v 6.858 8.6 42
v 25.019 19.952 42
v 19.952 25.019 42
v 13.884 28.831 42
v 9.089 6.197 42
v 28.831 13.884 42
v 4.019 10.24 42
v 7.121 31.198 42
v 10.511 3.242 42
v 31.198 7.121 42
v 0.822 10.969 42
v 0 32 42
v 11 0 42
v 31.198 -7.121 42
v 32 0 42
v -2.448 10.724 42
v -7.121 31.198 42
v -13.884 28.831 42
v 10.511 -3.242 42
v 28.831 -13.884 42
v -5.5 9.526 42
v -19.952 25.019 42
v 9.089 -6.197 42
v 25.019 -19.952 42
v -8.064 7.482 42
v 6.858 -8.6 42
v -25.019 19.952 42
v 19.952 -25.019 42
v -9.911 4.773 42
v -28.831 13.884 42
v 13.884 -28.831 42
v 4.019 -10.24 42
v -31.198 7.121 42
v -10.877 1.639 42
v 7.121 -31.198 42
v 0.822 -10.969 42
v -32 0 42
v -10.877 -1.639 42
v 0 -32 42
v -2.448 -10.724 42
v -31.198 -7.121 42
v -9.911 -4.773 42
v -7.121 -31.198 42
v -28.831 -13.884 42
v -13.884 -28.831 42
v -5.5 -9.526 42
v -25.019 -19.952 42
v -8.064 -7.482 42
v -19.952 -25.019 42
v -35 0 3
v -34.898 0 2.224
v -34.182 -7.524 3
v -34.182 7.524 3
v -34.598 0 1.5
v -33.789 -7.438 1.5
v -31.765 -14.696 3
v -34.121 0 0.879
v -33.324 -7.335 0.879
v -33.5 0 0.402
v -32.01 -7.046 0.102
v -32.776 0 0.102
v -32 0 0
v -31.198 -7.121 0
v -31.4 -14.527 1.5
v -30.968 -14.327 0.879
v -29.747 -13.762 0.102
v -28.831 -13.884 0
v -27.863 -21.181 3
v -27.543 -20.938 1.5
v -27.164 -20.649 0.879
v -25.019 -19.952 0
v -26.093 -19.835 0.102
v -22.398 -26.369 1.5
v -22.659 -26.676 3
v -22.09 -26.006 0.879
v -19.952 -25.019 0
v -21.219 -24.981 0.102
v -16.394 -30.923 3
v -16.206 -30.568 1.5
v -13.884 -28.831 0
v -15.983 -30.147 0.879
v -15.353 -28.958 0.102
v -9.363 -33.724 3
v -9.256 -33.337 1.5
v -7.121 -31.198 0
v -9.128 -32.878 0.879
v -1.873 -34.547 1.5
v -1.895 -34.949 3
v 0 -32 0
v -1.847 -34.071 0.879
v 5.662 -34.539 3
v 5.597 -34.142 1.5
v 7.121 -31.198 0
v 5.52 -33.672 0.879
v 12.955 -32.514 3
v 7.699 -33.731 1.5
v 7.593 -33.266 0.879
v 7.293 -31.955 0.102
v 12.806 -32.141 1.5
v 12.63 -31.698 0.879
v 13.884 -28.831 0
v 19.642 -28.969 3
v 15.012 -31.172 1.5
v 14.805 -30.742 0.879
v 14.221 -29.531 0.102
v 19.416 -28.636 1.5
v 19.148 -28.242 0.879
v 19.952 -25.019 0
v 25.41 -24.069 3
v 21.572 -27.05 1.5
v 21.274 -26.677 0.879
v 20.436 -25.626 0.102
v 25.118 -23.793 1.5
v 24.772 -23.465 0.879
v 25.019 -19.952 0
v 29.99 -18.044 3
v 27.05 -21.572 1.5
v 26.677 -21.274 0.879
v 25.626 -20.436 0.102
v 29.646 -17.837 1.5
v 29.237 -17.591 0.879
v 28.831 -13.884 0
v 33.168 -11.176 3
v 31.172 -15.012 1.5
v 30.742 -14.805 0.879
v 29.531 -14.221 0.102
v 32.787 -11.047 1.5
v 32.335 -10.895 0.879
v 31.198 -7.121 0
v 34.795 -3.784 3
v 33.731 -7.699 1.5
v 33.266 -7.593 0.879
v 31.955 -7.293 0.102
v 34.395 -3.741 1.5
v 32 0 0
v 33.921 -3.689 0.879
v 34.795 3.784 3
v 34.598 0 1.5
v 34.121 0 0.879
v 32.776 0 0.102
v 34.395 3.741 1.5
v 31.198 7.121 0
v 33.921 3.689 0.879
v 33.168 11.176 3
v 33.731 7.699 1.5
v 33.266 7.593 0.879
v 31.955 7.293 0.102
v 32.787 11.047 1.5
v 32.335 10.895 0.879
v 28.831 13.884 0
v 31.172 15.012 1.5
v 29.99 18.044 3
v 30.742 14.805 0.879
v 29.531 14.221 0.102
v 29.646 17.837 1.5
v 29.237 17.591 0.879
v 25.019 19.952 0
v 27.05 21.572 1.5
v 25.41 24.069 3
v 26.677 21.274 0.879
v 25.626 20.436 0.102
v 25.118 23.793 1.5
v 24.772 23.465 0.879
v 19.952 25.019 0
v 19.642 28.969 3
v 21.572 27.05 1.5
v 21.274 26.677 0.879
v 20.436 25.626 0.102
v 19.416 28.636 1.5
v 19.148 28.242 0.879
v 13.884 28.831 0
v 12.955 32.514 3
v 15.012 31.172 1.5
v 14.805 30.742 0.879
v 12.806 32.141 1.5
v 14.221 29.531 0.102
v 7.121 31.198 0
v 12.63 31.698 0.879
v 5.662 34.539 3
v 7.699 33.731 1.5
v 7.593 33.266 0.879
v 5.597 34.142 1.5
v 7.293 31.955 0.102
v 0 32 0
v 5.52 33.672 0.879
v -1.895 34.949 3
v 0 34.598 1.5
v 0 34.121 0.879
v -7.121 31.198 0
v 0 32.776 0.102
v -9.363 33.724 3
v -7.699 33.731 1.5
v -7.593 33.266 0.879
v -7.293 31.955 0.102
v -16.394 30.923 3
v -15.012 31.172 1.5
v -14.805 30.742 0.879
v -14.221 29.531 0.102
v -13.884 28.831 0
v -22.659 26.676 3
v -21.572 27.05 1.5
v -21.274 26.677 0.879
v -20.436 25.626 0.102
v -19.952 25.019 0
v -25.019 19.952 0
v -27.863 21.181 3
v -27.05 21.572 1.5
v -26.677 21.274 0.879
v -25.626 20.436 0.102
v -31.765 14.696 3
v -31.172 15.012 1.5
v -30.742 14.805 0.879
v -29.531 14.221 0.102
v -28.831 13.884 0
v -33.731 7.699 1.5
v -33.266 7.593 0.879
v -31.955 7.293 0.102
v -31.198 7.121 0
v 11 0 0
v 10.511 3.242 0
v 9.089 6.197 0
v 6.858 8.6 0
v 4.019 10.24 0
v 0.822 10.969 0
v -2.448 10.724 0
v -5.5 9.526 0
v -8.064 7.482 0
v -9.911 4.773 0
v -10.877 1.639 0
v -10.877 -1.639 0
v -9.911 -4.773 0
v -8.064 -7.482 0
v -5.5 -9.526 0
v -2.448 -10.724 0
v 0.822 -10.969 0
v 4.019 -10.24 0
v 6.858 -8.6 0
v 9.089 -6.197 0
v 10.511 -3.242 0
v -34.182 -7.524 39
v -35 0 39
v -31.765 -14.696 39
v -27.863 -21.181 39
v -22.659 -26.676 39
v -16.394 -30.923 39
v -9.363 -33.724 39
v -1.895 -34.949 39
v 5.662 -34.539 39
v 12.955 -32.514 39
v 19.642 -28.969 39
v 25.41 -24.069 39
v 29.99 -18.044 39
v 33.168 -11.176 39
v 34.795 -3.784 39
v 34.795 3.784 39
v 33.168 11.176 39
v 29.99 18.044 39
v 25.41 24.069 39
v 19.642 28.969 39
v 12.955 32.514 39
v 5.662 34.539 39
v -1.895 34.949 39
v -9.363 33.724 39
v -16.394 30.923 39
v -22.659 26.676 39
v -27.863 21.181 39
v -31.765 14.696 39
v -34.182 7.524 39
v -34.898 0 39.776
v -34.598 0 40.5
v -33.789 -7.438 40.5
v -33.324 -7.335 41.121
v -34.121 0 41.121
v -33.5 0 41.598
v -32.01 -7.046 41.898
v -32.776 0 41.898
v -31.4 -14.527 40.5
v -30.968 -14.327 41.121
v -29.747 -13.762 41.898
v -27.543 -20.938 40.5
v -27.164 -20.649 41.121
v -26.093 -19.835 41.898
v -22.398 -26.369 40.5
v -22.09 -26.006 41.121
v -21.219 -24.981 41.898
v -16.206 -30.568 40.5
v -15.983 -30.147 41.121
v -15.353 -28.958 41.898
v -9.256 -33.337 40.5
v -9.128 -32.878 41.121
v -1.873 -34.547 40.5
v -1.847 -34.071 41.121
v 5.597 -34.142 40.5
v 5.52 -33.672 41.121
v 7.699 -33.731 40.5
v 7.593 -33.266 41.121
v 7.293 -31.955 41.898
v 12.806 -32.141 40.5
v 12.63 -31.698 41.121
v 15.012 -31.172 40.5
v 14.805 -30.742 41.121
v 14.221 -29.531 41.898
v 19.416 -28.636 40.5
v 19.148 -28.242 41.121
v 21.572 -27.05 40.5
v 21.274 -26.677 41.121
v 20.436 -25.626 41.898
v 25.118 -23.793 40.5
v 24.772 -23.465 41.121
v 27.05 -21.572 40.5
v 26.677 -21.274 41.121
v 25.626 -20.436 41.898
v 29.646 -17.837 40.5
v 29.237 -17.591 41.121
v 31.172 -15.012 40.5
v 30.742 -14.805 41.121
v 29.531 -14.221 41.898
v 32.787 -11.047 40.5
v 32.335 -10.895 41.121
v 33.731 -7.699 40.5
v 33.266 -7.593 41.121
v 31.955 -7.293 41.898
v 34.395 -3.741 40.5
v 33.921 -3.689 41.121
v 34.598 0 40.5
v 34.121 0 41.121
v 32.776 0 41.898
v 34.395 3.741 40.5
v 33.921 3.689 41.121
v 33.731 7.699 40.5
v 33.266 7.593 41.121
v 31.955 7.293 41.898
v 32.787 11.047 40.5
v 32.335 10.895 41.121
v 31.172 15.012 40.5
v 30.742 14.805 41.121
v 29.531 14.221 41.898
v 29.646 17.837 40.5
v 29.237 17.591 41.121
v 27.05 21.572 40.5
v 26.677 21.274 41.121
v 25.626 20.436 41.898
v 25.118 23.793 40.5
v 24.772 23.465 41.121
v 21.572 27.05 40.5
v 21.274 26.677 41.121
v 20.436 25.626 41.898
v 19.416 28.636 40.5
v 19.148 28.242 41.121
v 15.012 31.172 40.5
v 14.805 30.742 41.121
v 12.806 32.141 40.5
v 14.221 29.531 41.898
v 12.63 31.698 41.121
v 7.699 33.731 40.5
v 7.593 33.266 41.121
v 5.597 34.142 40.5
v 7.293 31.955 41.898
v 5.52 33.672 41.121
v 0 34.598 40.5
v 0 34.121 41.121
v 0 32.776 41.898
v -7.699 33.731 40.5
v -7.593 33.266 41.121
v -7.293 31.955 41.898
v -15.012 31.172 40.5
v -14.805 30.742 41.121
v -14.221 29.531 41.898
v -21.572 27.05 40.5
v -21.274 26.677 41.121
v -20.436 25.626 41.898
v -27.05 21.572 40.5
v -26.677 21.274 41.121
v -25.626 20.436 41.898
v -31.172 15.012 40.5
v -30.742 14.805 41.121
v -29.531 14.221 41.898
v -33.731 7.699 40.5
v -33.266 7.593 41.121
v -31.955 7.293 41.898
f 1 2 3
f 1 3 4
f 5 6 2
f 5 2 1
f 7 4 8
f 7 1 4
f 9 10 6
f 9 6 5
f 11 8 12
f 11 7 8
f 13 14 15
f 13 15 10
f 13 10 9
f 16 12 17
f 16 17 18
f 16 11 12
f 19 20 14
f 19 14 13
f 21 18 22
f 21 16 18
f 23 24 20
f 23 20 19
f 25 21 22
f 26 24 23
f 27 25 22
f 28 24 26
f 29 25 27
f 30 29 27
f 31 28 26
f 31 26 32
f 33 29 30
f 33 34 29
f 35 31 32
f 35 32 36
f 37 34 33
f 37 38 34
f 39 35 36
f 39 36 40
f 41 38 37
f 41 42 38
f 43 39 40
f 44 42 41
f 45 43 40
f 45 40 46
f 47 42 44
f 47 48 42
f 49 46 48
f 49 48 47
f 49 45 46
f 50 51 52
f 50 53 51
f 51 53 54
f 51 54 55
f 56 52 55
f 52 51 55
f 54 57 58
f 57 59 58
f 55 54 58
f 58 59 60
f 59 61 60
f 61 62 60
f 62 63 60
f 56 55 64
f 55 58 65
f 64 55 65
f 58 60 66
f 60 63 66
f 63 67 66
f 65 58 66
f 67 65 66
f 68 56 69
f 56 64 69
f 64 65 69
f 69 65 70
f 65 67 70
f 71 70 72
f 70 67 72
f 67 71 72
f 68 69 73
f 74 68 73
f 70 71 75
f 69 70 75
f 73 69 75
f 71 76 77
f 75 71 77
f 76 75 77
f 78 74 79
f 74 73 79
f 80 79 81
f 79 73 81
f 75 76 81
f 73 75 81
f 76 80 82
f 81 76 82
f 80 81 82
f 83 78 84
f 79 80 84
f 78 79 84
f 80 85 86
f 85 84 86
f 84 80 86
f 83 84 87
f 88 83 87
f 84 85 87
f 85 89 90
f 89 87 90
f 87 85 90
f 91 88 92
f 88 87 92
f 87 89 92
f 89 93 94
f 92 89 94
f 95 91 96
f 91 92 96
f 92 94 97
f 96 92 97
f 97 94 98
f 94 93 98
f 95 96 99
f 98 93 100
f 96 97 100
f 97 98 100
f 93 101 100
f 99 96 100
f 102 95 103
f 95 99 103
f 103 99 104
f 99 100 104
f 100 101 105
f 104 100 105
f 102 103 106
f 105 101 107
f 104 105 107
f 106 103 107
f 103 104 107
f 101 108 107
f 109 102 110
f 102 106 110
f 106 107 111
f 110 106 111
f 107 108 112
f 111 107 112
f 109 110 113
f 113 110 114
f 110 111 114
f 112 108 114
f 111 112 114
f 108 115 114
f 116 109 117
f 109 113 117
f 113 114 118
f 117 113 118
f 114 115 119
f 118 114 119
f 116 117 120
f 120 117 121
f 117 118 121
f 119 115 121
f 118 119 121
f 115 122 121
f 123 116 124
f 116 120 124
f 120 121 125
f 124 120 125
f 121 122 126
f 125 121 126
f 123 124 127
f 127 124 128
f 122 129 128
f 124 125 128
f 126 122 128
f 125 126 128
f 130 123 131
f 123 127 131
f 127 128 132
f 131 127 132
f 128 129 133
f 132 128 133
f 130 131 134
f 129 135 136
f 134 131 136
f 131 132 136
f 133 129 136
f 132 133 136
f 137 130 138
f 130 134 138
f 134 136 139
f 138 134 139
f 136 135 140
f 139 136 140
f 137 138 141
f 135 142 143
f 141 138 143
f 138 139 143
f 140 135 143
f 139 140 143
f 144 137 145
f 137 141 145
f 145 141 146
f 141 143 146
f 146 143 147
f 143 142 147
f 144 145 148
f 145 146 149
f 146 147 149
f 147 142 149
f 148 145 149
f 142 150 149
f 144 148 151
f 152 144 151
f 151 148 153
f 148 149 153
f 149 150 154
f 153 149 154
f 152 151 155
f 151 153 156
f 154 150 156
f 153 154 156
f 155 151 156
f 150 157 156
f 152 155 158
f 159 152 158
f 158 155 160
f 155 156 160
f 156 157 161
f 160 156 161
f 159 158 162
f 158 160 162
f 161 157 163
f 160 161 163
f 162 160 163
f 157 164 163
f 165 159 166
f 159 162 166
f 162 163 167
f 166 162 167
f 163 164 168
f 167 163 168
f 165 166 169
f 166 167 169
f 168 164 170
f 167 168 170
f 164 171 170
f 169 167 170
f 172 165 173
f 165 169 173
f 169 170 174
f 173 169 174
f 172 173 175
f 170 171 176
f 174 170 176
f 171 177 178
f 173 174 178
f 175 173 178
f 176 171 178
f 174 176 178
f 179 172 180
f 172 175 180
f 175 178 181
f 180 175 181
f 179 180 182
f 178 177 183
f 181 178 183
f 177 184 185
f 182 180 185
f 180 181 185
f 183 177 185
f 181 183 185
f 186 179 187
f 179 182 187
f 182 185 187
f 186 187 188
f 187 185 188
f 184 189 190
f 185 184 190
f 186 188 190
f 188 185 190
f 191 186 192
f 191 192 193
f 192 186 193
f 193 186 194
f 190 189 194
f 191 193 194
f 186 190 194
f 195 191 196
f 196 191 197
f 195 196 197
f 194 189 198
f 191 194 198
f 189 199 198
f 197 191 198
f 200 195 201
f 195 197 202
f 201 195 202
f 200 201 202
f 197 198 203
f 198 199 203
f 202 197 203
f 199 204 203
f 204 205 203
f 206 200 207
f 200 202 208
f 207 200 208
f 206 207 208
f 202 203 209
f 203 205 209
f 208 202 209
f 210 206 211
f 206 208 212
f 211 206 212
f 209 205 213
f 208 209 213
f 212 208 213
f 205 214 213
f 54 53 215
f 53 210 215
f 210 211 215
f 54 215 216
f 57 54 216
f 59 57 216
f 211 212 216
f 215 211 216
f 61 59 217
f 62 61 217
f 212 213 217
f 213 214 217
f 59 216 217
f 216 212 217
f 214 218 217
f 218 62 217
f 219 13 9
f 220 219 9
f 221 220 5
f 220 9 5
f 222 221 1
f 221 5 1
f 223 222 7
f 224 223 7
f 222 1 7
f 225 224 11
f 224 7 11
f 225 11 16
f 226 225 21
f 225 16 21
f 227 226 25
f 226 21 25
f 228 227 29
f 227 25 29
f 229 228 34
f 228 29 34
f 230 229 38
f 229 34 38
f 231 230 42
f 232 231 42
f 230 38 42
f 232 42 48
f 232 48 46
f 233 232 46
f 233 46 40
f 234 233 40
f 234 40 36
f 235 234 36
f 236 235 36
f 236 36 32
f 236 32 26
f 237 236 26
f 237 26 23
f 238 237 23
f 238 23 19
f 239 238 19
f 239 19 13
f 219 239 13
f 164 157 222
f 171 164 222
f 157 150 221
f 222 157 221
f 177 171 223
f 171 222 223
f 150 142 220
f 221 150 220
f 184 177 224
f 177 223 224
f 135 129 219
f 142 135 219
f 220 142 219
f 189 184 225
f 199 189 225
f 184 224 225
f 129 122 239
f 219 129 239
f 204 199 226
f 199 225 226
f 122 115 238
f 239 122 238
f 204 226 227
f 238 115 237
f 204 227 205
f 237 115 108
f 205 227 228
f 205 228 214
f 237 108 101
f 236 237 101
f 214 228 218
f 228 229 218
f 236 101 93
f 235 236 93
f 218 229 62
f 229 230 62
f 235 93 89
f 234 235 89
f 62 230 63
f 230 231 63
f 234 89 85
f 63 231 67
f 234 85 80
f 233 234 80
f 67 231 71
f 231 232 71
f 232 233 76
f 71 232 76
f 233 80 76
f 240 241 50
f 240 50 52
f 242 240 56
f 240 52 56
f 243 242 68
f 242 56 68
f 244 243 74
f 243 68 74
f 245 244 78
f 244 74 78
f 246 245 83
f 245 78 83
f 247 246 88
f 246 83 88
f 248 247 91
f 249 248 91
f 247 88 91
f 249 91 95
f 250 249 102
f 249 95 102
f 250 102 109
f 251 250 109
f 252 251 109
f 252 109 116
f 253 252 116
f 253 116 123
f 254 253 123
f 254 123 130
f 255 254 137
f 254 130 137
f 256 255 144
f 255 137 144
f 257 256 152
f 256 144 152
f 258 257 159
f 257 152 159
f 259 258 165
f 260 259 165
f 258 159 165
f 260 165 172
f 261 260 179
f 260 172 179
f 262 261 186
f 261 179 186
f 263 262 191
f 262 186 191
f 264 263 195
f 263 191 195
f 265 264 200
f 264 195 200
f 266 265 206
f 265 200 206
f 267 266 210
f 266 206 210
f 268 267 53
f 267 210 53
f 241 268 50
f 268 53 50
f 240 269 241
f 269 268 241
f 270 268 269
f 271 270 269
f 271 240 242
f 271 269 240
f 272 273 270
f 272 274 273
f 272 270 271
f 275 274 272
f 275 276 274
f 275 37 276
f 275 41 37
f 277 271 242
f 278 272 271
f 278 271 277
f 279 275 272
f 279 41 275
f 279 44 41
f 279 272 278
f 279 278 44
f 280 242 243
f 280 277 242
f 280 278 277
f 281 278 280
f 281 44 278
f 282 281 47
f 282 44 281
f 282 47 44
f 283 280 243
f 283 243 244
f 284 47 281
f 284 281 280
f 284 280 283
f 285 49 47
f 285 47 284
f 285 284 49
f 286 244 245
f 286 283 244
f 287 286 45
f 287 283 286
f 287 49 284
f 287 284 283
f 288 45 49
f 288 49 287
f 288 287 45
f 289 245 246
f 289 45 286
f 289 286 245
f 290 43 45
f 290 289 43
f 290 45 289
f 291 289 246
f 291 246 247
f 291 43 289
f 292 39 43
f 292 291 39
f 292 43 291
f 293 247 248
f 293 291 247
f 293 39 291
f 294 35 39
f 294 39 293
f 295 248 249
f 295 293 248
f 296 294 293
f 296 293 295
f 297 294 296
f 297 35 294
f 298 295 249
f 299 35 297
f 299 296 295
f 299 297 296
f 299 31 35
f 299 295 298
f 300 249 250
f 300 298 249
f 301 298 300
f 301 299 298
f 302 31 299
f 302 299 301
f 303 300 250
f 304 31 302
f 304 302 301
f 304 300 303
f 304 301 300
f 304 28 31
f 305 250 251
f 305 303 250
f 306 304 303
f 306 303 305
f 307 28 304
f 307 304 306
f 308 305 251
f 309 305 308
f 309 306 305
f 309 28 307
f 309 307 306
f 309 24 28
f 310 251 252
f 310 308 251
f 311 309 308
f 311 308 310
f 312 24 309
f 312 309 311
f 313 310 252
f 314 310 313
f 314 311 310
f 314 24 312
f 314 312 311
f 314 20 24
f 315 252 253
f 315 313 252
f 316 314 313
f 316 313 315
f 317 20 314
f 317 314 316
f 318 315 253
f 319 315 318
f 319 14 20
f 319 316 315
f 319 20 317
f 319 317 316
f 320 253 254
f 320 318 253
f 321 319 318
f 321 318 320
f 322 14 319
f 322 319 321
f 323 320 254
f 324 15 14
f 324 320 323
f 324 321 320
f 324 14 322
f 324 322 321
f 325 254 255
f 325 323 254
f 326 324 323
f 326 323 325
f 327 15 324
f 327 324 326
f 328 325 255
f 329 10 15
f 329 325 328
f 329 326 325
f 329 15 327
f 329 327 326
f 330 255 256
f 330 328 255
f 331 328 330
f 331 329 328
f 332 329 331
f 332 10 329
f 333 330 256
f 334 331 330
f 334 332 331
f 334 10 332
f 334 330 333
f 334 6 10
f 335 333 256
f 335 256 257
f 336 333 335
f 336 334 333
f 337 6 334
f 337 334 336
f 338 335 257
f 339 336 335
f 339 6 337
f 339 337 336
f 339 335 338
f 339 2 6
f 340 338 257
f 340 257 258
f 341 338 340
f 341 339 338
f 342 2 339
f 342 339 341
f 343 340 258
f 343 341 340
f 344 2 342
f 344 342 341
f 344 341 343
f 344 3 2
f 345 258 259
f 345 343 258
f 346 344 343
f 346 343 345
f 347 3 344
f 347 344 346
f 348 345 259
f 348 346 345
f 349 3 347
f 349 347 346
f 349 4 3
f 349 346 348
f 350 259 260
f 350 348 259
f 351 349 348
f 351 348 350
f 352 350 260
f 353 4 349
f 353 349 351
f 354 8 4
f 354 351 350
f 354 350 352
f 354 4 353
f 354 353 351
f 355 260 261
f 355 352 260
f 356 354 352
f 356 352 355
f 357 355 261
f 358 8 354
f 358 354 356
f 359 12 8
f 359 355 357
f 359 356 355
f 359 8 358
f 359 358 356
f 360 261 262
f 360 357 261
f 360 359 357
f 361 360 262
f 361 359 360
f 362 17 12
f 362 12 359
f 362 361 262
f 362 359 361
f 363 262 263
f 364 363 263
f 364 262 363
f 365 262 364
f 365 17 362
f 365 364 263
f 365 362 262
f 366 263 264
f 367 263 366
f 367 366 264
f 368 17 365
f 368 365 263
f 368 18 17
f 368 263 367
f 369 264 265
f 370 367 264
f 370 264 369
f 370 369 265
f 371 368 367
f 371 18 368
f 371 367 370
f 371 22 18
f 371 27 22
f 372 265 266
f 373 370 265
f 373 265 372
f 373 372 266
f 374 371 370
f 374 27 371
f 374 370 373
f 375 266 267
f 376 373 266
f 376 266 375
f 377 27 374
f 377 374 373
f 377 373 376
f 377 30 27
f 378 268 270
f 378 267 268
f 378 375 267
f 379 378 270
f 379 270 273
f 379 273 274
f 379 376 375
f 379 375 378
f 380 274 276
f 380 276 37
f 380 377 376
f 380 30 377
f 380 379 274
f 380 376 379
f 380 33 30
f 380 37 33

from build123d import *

# Parameters (mm, degrees)
SKETCH1_R           = 35
BOSS_EXTRUDE1_DEPTH = 42
FILLET1_R           = 3
SKETCH2_R           = 11
CUT_EXTRUDE1_DEPTH  = 65.915329522


with BuildPart() as part:
    # Sketch1 → Boss-Extrude1 (new body)
    with BuildSketch(Plane.XY):
        with Locations(Location((0, 0, 0), (0, 0, 180))):
            Circle(SKETCH1_R)
    extrude(amount=BOSS_EXTRUDE1_DEPTH)

    # Fillet1
    fillet1_edges = [part.edges().sort_by_distance(p)[0] for p in [
        (35, 0, 0),
        (35, 0, 42),
    ]]
    fillet(fillet1_edges, radius=FILLET1_R)

    # Sketch2 → Cut-Extrude1 (cut, through all)
    with BuildSketch(Plane.XY.offset(42)):
        Circle(SKETCH2_R)
    extrude(amount=-CUT_EXTRUDE1_DEPTH, mode=Mode.SUBTRACT)


solid = part.part
